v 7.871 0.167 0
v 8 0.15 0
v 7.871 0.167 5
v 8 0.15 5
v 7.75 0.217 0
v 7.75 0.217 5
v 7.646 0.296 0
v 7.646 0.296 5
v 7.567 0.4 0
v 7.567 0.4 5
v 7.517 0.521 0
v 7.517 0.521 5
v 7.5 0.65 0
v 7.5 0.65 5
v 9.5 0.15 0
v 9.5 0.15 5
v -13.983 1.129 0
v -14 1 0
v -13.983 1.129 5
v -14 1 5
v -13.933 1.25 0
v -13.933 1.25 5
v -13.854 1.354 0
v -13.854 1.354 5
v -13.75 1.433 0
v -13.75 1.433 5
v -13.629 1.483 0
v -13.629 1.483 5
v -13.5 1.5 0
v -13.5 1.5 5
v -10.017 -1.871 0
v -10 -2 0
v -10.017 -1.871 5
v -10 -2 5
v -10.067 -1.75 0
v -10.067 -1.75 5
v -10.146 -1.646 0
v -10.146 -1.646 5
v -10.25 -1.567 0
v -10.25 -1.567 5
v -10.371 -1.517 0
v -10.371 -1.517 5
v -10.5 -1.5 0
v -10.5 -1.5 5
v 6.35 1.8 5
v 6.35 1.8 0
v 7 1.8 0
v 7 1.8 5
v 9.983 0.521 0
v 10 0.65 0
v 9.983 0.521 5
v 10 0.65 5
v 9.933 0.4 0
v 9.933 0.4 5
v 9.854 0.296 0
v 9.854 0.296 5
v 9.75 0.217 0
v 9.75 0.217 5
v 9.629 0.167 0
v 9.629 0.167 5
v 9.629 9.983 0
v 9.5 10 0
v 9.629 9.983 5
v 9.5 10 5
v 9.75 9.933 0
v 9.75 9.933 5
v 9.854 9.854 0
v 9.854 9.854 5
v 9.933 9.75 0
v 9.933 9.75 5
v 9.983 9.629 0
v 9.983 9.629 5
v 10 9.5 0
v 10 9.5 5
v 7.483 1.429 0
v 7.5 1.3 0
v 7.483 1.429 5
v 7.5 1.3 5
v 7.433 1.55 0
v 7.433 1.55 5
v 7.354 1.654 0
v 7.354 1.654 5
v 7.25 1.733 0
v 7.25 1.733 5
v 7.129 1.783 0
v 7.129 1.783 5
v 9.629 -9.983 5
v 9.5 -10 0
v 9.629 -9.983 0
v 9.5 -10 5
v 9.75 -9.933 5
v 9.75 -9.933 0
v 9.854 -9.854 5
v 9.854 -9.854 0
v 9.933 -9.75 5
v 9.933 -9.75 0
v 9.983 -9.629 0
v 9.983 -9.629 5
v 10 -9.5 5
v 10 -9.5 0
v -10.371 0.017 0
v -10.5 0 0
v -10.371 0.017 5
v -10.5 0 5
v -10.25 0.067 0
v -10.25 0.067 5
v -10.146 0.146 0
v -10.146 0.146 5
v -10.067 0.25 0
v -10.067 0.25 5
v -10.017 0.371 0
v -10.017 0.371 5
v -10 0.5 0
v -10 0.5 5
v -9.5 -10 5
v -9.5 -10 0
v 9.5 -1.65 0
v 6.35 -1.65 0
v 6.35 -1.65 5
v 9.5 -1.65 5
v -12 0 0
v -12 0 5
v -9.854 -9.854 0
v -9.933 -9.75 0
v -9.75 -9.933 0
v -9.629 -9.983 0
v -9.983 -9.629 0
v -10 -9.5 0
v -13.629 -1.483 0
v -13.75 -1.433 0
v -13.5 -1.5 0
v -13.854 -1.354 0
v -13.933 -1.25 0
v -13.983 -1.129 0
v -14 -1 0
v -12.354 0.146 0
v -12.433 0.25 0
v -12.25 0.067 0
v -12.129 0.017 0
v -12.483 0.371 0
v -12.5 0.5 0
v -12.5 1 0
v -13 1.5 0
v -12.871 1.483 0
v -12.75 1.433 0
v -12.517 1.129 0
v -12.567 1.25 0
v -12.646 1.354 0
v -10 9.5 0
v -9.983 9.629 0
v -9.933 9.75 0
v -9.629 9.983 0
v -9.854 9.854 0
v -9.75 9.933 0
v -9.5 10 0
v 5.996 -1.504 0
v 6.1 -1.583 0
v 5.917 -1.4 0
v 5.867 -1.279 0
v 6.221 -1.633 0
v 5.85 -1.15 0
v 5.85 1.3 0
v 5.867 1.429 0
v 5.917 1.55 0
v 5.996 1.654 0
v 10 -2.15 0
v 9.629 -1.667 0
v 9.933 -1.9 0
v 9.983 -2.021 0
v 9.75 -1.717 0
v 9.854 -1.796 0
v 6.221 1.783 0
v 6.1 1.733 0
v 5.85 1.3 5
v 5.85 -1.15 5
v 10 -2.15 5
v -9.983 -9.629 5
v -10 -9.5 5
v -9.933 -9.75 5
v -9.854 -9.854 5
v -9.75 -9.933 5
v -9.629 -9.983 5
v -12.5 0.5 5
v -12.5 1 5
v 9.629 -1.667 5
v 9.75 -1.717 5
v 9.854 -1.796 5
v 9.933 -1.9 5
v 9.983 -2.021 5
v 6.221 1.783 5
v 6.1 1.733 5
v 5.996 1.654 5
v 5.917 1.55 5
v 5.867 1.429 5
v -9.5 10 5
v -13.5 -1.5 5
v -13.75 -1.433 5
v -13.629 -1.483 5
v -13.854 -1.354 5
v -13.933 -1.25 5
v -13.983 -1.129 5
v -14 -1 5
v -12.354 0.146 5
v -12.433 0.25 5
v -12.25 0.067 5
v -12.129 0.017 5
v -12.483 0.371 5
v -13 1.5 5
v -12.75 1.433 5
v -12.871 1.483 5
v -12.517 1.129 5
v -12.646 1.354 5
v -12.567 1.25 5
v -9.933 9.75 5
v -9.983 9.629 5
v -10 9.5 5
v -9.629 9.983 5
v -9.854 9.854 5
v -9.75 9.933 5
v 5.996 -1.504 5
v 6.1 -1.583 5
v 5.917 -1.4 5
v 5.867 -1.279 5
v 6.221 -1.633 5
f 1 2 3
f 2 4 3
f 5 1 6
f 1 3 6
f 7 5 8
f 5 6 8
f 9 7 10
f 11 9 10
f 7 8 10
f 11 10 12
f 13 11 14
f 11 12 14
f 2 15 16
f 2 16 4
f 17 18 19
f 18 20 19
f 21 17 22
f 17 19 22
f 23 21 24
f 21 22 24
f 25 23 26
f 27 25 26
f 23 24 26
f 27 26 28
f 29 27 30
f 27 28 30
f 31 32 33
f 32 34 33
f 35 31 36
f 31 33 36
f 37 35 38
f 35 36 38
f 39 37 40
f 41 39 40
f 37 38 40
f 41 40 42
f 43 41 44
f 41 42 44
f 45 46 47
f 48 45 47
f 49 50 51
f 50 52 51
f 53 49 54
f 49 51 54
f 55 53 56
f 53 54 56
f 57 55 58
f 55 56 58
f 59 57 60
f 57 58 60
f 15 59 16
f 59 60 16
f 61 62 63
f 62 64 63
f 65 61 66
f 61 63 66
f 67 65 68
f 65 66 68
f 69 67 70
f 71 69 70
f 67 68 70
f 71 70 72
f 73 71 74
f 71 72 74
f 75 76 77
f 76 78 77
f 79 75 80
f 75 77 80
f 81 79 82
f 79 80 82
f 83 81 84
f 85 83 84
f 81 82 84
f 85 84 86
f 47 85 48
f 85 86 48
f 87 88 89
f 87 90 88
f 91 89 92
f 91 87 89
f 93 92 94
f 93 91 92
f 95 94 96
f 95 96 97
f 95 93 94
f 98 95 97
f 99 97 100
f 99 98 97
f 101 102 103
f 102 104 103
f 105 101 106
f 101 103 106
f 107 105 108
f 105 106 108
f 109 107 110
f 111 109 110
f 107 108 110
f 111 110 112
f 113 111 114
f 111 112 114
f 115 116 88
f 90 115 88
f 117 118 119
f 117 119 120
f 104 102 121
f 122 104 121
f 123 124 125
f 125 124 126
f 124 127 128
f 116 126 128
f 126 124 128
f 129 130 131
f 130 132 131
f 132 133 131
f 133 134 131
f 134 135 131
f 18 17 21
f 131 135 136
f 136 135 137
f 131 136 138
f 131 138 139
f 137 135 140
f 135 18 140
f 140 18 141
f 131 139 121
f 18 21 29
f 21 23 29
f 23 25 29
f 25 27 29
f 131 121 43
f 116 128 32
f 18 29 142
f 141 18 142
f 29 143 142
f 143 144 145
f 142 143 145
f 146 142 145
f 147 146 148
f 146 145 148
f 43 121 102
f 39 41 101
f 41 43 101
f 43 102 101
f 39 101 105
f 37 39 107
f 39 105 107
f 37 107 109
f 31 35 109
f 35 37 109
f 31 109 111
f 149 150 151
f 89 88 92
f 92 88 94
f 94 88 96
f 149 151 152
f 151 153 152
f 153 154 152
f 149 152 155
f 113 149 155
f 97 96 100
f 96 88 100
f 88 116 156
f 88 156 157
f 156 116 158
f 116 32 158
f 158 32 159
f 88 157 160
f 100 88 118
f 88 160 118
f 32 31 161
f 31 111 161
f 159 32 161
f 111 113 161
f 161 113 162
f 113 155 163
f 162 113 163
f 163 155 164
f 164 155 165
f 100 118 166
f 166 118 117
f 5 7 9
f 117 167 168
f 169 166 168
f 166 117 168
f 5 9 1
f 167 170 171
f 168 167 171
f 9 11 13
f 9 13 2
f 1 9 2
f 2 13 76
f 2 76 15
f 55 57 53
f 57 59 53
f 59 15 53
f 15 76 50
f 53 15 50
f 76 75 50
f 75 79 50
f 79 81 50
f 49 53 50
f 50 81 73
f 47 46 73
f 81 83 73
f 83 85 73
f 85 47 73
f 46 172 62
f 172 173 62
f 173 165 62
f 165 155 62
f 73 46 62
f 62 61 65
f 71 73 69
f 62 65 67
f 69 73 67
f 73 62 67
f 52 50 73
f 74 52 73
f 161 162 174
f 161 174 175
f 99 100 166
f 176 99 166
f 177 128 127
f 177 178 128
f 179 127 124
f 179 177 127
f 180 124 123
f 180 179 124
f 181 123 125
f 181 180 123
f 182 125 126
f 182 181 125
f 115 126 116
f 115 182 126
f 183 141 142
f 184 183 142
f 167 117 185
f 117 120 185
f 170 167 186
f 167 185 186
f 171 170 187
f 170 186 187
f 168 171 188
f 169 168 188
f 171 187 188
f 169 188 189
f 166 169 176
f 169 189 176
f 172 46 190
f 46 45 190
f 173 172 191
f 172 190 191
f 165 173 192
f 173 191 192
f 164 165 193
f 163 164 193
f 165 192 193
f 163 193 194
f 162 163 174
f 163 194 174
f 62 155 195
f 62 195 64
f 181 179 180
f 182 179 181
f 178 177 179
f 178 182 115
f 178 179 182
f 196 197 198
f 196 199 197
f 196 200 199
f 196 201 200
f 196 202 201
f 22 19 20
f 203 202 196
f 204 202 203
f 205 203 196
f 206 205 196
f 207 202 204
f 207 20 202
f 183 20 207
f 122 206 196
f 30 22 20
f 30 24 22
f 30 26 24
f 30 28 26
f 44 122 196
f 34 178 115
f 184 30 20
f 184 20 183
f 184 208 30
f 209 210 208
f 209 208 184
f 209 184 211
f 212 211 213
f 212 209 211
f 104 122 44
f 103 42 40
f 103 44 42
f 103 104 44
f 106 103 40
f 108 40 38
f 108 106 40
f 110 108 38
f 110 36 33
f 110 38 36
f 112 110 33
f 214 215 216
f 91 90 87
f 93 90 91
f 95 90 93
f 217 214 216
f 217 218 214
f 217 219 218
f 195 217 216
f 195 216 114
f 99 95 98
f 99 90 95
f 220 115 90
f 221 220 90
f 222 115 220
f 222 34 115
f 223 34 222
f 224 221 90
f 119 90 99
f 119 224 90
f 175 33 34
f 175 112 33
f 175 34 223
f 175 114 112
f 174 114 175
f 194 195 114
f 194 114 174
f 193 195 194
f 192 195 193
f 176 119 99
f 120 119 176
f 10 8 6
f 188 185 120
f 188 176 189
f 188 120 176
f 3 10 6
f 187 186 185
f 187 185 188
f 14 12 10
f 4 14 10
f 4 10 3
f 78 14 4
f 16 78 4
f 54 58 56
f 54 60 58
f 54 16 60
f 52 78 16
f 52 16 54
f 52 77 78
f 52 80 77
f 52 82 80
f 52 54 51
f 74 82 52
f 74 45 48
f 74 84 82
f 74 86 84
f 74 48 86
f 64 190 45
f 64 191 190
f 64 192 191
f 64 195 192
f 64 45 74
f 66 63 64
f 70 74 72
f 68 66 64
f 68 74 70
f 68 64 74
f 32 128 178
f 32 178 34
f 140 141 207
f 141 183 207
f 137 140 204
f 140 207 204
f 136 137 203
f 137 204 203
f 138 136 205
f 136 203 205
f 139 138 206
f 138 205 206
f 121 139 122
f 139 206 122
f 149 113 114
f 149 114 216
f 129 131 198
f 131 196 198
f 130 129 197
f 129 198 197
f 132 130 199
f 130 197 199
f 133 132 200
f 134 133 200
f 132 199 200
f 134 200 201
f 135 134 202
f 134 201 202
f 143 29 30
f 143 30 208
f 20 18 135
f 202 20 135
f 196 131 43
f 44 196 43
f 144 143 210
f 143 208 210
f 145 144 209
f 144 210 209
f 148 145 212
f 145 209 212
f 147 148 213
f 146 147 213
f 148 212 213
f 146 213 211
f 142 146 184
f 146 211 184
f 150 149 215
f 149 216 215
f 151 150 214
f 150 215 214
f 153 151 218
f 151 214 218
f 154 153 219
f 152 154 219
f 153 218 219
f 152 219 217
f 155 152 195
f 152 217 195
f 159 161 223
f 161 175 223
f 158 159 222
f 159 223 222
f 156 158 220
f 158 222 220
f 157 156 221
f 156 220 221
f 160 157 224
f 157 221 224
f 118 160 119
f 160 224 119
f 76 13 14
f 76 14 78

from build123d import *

# Parameters (mm, degrees)
F0_W     = 20
F0_H     = 20
F1_DEPTH = 5
F2_W     = 1.5
F2_H     = 1.5
F3_DEPTH = 5
F4_W     = 1.65
F4_H     = 1.65
F5_DEPTH = 5
F6_R     = 0.5


with BuildPart() as f1:
    # F0 (on Top) → F1 (new body)
    with BuildSketch(Plane.XY):
        Rectangle(F0_W, F0_H)
    extrude(amount=F1_DEPTH)

    # F2 (on Top) → F3 (join)
    with BuildSketch(Plane.XY):
        Polygon((-10, -1.5), (-10, 0), (-12.5, 0), (-14, 0), (-14, -1.5), align=None)
        with Locations((-13.25, 0.75)):
            Rectangle(F2_W, F2_H)
    extrude(amount=F3_DEPTH)

    # F4 (on Top) → F5 (cut)
    with BuildSketch(Plane.XY):
        Polygon((10, -1.65), (10, 0.15), (7.5, 0.15), (5.85, 0.15), (5.85, -1.65), align=None)
        with Locations((6.675, 0.975)):
            Rectangle(F4_W, F4_H)
    extrude(amount=F5_DEPTH, mode=Mode.SUBTRACT)

    # F6
    f6_edges = [f1.edges().sort_by_distance(p)[0] for p in [
        (-14, -1.5, 2.5),
        (-14, 1.5, 2.5),
        (-12.5, 1.5, 2.5),
        (-10, 0, 2.5),
        (-12.5, 0, 2.5),
        (-10, -1.5, 2.5),
        (5.85, 1.8, 2.5),
        (7.5, 1.8, 2.5),
        (7.5, 0.15, 2.5),
        (10, 0.15, 2.5),
        (10, -1.65, 2.5),
        (5.85, -1.65, 2.5),
        (10, -10, 2.5),
        (10, 10, 2.5),
        (-10, 10, 2.5),
        (-10, -10, 2.5),
    ]]
    fillet(f6_edges, radius=F6_R)


solid = f1.part
